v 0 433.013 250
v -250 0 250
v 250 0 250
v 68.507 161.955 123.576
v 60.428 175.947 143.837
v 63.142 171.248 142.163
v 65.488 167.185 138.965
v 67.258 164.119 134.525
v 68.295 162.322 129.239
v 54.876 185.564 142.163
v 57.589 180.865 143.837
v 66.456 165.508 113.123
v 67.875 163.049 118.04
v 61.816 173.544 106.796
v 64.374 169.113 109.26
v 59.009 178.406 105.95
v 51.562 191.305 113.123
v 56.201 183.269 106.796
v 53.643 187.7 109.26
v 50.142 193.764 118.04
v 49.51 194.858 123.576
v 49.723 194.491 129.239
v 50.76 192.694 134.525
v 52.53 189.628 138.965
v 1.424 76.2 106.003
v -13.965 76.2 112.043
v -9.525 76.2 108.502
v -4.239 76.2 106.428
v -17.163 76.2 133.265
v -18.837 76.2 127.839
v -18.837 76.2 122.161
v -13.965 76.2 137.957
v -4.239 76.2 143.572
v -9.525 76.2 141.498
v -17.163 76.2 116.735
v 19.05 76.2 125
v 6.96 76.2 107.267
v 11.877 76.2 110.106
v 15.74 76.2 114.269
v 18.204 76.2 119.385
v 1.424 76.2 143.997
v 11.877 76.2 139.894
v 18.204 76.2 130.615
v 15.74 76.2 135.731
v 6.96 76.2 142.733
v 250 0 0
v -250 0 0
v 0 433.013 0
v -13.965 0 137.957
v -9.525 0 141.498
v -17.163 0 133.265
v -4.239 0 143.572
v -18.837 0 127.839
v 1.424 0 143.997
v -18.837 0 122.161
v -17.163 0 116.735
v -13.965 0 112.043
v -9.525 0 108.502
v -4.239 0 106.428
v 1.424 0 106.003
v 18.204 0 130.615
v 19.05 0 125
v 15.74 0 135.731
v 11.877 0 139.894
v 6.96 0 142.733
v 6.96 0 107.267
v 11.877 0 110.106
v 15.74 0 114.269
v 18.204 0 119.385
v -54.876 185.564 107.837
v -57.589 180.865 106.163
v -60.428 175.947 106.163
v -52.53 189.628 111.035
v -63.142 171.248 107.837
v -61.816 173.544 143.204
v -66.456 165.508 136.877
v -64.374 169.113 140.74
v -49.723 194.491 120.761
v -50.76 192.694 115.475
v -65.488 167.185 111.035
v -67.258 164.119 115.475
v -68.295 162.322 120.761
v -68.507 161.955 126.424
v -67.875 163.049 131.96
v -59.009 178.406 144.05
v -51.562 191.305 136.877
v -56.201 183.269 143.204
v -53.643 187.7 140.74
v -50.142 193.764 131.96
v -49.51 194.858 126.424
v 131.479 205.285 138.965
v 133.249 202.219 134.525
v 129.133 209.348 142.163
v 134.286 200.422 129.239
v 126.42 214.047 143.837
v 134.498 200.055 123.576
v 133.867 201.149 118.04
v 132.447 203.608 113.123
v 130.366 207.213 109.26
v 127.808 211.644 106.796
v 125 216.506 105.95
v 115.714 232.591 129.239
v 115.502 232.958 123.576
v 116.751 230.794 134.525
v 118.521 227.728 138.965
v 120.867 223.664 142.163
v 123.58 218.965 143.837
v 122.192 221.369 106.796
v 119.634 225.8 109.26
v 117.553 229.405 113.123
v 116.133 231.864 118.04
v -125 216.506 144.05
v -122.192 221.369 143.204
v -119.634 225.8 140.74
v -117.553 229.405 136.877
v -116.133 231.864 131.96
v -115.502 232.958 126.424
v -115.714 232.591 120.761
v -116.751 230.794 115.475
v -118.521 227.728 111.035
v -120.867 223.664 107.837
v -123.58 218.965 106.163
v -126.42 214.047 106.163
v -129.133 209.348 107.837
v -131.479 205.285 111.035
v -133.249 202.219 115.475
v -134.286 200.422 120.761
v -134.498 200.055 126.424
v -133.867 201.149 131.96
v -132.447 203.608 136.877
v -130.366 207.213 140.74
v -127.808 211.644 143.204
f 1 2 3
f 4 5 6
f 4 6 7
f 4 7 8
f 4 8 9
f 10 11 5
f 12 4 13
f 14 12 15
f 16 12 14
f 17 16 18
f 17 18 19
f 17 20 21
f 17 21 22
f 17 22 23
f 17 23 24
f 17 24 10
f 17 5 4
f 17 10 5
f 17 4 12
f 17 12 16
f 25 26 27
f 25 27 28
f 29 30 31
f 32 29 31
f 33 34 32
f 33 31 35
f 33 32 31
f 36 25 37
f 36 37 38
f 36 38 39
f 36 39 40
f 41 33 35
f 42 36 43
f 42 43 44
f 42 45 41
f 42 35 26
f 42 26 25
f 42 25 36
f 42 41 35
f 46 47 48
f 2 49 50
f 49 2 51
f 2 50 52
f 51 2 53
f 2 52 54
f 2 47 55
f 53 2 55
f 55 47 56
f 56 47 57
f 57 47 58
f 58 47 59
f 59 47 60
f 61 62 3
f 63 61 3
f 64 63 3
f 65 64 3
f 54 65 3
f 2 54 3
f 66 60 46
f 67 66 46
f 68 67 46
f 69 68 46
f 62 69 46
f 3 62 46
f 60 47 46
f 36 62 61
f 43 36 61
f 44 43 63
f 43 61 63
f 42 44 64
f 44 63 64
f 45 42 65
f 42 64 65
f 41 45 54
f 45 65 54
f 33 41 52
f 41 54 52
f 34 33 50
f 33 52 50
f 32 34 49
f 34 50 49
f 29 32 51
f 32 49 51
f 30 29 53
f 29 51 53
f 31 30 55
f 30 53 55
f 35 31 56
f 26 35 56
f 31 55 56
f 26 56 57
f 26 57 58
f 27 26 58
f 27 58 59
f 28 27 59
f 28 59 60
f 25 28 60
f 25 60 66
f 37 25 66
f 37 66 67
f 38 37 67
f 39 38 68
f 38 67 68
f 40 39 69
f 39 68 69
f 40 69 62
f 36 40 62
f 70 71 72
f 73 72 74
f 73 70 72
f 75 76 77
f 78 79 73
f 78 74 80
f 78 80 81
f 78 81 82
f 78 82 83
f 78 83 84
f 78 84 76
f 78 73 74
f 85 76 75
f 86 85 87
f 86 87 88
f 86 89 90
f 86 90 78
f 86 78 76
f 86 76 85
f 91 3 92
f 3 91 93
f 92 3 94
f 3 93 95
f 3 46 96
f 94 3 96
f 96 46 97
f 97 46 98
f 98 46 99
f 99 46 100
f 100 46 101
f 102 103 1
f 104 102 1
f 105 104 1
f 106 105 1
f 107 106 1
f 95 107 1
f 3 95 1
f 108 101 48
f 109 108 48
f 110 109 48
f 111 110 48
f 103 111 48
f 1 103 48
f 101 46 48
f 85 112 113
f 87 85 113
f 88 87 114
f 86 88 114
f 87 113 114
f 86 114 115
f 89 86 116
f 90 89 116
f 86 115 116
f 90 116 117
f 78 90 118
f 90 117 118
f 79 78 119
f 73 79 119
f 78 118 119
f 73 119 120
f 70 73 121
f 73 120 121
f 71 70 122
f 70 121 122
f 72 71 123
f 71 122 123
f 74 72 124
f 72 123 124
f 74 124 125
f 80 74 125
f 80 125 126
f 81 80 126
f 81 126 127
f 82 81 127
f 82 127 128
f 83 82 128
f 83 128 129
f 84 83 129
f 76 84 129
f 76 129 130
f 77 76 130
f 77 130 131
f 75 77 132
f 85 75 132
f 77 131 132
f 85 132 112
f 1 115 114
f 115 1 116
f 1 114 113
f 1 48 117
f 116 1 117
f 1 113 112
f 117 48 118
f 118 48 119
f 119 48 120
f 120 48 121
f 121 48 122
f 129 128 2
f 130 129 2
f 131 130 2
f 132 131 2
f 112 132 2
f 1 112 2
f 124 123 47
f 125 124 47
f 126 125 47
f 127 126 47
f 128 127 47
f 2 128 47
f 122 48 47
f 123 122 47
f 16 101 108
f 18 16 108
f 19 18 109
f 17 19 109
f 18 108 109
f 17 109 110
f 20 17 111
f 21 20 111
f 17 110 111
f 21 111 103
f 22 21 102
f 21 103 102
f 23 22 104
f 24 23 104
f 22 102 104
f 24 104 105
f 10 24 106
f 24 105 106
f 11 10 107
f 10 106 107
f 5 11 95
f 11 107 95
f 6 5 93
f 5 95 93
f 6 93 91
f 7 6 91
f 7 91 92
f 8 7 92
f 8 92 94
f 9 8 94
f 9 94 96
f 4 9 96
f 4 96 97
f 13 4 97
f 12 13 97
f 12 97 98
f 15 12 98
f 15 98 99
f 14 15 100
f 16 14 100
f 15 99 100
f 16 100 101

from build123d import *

# Parameters (mm, degrees)
BOSS_EXTRUDE1_DEPTH = 250
SKETCH2_R           = 19.05
CUT_EXTRUDE1_DEPTH  = 76.2
SKETCH3_R           = 19.05
CUT_EXTRUDE2_DEPTH  = 76.2
SKETCH4_R           = 19.05
CUT_EXTRUDE3_DEPTH  = 76.2


with BuildPart() as part:
    # Sketch1 → Boss-Extrude1 (new body)
    with BuildSketch(Plane.XY):
        Polygon((0, 0), (250, 0), (0, 433.012701892), (-250, 0), align=None)
    extrude(amount=BOSS_EXTRUDE1_DEPTH)

    # Sketch2 → Cut-Extrude1 (cut)
    with BuildSketch(Plane(origin=(187.5, 108.253175473, 0), x_dir=(0, 0, -1), z_dir=(0.866025404, 0.5, 0))):
        with Locations((-125, 125)):
            Circle(SKETCH2_R)
    extrude(amount=-CUT_EXTRUDE1_DEPTH, mode=Mode.SUBTRACT)

    # Sketch3 → Cut-Extrude2 (cut)
    with BuildSketch(Plane.XZ):
        with Locations((0, 125)):
            Circle(SKETCH3_R)
    extrude(amount=-CUT_EXTRUDE2_DEPTH, mode=Mode.SUBTRACT)

    # Sketch4 → Cut-Extrude3 (cut)
    with BuildSketch(Plane(origin=(-187.5, 108.253175473, 0), x_dir=(0, 0, 1), z_dir=(-0.866025404, 0.5, 0))):
        with Locations((125, 125)):
            Circle(SKETCH4_R)
    extrude(amount=-CUT_EXTRUDE3_DEPTH, mode=Mode.SUBTRACT)


solid = part.part
